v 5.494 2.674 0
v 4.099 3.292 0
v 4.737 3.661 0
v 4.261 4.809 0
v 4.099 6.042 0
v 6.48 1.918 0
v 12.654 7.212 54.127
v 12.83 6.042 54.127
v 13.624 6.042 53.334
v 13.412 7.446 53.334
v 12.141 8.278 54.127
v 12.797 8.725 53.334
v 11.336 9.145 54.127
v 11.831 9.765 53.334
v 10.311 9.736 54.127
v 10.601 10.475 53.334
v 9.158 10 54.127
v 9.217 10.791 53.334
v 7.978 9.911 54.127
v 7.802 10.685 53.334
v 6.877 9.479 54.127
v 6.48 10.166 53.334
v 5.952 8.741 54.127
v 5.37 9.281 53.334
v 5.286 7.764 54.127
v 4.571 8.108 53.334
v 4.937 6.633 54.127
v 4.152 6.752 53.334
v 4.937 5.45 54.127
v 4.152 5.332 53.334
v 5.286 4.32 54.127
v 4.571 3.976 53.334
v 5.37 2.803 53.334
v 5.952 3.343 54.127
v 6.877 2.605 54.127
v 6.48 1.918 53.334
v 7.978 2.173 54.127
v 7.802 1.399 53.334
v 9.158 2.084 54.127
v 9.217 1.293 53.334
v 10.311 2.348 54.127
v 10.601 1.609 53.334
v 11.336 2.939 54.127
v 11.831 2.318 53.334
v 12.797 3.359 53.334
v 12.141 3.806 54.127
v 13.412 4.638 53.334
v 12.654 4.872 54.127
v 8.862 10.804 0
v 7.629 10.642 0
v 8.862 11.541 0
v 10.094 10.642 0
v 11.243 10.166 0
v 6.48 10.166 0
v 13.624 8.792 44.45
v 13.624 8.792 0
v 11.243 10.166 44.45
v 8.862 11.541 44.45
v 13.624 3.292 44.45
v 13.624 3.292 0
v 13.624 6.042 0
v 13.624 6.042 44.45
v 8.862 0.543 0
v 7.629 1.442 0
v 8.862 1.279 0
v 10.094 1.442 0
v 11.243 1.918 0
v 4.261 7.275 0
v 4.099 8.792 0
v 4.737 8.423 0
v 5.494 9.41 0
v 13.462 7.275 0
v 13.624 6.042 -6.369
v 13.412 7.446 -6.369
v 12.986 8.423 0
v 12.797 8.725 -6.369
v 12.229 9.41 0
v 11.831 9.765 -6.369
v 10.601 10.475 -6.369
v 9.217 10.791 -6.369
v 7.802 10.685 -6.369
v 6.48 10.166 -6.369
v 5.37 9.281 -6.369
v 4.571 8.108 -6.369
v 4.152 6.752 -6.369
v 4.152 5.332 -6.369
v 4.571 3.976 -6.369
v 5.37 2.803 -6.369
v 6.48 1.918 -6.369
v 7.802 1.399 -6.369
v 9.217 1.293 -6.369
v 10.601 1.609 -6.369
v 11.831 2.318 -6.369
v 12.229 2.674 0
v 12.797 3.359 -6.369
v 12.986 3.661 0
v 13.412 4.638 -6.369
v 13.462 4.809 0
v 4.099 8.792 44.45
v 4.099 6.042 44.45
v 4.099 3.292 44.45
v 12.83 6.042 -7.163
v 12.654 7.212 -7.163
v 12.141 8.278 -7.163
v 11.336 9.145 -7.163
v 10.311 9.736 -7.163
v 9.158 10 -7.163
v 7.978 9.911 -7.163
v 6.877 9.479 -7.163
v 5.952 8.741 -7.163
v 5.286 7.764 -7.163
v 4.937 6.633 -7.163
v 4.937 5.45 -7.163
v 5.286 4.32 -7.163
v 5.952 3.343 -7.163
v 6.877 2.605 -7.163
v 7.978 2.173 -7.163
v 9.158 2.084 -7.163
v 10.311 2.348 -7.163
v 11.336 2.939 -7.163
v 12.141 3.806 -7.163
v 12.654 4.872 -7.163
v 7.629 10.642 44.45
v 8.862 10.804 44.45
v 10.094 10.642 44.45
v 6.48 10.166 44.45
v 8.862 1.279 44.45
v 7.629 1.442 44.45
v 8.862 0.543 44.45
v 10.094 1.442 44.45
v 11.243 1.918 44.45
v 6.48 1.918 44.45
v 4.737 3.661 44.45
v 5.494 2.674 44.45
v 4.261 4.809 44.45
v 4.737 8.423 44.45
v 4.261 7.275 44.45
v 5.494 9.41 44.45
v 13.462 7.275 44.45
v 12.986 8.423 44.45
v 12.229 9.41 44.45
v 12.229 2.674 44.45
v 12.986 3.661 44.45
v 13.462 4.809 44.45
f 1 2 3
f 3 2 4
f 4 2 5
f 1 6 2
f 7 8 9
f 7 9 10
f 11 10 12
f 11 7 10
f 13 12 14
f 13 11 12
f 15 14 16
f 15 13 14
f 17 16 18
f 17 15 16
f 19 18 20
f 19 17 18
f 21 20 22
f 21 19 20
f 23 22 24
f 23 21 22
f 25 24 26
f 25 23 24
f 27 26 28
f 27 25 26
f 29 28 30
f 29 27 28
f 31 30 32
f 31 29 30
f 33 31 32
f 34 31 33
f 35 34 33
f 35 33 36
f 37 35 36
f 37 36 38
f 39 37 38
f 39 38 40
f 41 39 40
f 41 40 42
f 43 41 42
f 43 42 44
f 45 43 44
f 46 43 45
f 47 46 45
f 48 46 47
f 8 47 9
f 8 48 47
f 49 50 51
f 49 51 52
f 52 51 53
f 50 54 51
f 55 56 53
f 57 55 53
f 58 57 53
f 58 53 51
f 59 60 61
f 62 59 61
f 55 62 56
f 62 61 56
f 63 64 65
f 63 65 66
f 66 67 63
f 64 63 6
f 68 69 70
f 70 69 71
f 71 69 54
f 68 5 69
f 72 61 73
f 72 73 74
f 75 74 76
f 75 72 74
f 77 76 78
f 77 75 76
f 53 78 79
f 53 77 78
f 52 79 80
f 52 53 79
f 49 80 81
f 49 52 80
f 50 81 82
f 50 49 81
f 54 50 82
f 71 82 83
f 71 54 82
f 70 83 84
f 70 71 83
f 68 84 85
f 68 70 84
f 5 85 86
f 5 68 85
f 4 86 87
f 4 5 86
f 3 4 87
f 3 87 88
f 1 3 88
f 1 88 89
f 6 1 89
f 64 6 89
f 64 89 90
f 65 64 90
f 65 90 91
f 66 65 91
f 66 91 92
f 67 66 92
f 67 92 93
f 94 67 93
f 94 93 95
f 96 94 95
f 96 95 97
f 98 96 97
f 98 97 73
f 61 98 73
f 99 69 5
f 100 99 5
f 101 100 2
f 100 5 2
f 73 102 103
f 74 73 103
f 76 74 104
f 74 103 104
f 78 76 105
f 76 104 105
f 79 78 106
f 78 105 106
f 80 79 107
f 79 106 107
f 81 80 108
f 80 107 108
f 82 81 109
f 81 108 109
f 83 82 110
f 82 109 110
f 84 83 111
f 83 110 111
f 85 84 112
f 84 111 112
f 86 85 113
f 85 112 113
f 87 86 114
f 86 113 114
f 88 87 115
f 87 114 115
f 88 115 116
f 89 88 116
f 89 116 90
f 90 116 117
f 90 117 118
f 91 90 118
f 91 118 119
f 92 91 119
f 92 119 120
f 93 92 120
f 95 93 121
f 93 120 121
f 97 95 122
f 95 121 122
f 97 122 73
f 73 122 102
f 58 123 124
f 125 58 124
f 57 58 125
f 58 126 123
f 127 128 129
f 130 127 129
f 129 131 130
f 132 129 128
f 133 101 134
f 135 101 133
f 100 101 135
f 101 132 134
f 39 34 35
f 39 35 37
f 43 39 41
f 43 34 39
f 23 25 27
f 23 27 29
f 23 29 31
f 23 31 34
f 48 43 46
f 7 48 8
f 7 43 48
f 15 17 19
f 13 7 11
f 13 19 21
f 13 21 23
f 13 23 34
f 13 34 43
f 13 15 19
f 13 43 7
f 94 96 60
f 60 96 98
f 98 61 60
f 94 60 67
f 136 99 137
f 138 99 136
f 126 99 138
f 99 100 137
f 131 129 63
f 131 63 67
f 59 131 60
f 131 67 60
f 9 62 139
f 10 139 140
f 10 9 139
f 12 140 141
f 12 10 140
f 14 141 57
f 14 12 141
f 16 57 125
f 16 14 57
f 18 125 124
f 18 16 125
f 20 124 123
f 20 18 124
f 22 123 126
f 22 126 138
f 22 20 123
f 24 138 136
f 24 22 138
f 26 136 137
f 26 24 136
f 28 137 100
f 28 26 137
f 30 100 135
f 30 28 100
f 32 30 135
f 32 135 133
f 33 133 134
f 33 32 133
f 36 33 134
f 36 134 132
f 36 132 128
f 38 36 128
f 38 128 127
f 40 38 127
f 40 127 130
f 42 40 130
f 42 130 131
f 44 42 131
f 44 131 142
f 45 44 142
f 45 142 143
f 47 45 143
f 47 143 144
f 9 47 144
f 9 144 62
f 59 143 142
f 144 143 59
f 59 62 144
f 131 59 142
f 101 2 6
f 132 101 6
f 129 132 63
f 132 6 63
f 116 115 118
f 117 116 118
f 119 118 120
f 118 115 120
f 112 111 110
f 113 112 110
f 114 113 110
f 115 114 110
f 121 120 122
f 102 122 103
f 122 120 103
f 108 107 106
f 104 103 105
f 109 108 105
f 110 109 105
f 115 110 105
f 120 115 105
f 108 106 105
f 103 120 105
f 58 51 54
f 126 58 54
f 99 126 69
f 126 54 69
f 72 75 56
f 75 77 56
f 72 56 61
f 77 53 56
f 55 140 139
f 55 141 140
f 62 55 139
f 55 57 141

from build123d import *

# Parameters (mm, degrees)
SKETCH1_R           = 4.7625
BOSS_EXTRUDE1_DEPTH = 7.1628
BOSS_EXTRUDE2_DEPTH = 44.45
BOSS_EXTRUDE3_START = 9.6774
SKETCH3_R           = 4.7625
BOSS_EXTRUDE3_DEPTH = 9.6774
CHAMFER1_SIZE       = 0.79375


with BuildPart() as part:
    # Sketch1 → Boss-Extrude1 (new body)
    with BuildSketch(Plane.XY):
        with Locations((8.861538462, 6.041958042)):
            Circle(SKETCH1_R)
    extrude(amount=-BOSS_EXTRUDE1_DEPTH)

    # Sketch2 → Boss-Extrude2 (add)
    with BuildSketch(Plane.XY):
        Polygon((13.624038462, 8.791588699), (8.861538462, 11.541219356), (4.099038462, 8.791588699), (4.099038462, 3.292327385), (8.861538462, 0.542696728), (13.624038462, 3.292327385), align=None)
    extrude(amount=BOSS_EXTRUDE2_DEPTH)

    # Sketch3 → Boss-Extrude3 (add)
    with BuildSketch(Plane.XY.offset(44.45).offset(BOSS_EXTRUDE3_START)):
        with Locations((8.861538462, 6.041958042)):
            Circle(SKETCH3_R)
    extrude(amount=-BOSS_EXTRUDE3_DEPTH)

    # Chamfer1
    chamfer1_edges = [part.edges().sort_by_distance(p)[0] for p in [
        (4.099038462, 6.041958042, 54.1274),
        (4.099038462, 6.041958042, -7.1628),
    ]]
    chamfer(chamfer1_edges, length=CHAMFER1_SIZE)


solid = part.part
